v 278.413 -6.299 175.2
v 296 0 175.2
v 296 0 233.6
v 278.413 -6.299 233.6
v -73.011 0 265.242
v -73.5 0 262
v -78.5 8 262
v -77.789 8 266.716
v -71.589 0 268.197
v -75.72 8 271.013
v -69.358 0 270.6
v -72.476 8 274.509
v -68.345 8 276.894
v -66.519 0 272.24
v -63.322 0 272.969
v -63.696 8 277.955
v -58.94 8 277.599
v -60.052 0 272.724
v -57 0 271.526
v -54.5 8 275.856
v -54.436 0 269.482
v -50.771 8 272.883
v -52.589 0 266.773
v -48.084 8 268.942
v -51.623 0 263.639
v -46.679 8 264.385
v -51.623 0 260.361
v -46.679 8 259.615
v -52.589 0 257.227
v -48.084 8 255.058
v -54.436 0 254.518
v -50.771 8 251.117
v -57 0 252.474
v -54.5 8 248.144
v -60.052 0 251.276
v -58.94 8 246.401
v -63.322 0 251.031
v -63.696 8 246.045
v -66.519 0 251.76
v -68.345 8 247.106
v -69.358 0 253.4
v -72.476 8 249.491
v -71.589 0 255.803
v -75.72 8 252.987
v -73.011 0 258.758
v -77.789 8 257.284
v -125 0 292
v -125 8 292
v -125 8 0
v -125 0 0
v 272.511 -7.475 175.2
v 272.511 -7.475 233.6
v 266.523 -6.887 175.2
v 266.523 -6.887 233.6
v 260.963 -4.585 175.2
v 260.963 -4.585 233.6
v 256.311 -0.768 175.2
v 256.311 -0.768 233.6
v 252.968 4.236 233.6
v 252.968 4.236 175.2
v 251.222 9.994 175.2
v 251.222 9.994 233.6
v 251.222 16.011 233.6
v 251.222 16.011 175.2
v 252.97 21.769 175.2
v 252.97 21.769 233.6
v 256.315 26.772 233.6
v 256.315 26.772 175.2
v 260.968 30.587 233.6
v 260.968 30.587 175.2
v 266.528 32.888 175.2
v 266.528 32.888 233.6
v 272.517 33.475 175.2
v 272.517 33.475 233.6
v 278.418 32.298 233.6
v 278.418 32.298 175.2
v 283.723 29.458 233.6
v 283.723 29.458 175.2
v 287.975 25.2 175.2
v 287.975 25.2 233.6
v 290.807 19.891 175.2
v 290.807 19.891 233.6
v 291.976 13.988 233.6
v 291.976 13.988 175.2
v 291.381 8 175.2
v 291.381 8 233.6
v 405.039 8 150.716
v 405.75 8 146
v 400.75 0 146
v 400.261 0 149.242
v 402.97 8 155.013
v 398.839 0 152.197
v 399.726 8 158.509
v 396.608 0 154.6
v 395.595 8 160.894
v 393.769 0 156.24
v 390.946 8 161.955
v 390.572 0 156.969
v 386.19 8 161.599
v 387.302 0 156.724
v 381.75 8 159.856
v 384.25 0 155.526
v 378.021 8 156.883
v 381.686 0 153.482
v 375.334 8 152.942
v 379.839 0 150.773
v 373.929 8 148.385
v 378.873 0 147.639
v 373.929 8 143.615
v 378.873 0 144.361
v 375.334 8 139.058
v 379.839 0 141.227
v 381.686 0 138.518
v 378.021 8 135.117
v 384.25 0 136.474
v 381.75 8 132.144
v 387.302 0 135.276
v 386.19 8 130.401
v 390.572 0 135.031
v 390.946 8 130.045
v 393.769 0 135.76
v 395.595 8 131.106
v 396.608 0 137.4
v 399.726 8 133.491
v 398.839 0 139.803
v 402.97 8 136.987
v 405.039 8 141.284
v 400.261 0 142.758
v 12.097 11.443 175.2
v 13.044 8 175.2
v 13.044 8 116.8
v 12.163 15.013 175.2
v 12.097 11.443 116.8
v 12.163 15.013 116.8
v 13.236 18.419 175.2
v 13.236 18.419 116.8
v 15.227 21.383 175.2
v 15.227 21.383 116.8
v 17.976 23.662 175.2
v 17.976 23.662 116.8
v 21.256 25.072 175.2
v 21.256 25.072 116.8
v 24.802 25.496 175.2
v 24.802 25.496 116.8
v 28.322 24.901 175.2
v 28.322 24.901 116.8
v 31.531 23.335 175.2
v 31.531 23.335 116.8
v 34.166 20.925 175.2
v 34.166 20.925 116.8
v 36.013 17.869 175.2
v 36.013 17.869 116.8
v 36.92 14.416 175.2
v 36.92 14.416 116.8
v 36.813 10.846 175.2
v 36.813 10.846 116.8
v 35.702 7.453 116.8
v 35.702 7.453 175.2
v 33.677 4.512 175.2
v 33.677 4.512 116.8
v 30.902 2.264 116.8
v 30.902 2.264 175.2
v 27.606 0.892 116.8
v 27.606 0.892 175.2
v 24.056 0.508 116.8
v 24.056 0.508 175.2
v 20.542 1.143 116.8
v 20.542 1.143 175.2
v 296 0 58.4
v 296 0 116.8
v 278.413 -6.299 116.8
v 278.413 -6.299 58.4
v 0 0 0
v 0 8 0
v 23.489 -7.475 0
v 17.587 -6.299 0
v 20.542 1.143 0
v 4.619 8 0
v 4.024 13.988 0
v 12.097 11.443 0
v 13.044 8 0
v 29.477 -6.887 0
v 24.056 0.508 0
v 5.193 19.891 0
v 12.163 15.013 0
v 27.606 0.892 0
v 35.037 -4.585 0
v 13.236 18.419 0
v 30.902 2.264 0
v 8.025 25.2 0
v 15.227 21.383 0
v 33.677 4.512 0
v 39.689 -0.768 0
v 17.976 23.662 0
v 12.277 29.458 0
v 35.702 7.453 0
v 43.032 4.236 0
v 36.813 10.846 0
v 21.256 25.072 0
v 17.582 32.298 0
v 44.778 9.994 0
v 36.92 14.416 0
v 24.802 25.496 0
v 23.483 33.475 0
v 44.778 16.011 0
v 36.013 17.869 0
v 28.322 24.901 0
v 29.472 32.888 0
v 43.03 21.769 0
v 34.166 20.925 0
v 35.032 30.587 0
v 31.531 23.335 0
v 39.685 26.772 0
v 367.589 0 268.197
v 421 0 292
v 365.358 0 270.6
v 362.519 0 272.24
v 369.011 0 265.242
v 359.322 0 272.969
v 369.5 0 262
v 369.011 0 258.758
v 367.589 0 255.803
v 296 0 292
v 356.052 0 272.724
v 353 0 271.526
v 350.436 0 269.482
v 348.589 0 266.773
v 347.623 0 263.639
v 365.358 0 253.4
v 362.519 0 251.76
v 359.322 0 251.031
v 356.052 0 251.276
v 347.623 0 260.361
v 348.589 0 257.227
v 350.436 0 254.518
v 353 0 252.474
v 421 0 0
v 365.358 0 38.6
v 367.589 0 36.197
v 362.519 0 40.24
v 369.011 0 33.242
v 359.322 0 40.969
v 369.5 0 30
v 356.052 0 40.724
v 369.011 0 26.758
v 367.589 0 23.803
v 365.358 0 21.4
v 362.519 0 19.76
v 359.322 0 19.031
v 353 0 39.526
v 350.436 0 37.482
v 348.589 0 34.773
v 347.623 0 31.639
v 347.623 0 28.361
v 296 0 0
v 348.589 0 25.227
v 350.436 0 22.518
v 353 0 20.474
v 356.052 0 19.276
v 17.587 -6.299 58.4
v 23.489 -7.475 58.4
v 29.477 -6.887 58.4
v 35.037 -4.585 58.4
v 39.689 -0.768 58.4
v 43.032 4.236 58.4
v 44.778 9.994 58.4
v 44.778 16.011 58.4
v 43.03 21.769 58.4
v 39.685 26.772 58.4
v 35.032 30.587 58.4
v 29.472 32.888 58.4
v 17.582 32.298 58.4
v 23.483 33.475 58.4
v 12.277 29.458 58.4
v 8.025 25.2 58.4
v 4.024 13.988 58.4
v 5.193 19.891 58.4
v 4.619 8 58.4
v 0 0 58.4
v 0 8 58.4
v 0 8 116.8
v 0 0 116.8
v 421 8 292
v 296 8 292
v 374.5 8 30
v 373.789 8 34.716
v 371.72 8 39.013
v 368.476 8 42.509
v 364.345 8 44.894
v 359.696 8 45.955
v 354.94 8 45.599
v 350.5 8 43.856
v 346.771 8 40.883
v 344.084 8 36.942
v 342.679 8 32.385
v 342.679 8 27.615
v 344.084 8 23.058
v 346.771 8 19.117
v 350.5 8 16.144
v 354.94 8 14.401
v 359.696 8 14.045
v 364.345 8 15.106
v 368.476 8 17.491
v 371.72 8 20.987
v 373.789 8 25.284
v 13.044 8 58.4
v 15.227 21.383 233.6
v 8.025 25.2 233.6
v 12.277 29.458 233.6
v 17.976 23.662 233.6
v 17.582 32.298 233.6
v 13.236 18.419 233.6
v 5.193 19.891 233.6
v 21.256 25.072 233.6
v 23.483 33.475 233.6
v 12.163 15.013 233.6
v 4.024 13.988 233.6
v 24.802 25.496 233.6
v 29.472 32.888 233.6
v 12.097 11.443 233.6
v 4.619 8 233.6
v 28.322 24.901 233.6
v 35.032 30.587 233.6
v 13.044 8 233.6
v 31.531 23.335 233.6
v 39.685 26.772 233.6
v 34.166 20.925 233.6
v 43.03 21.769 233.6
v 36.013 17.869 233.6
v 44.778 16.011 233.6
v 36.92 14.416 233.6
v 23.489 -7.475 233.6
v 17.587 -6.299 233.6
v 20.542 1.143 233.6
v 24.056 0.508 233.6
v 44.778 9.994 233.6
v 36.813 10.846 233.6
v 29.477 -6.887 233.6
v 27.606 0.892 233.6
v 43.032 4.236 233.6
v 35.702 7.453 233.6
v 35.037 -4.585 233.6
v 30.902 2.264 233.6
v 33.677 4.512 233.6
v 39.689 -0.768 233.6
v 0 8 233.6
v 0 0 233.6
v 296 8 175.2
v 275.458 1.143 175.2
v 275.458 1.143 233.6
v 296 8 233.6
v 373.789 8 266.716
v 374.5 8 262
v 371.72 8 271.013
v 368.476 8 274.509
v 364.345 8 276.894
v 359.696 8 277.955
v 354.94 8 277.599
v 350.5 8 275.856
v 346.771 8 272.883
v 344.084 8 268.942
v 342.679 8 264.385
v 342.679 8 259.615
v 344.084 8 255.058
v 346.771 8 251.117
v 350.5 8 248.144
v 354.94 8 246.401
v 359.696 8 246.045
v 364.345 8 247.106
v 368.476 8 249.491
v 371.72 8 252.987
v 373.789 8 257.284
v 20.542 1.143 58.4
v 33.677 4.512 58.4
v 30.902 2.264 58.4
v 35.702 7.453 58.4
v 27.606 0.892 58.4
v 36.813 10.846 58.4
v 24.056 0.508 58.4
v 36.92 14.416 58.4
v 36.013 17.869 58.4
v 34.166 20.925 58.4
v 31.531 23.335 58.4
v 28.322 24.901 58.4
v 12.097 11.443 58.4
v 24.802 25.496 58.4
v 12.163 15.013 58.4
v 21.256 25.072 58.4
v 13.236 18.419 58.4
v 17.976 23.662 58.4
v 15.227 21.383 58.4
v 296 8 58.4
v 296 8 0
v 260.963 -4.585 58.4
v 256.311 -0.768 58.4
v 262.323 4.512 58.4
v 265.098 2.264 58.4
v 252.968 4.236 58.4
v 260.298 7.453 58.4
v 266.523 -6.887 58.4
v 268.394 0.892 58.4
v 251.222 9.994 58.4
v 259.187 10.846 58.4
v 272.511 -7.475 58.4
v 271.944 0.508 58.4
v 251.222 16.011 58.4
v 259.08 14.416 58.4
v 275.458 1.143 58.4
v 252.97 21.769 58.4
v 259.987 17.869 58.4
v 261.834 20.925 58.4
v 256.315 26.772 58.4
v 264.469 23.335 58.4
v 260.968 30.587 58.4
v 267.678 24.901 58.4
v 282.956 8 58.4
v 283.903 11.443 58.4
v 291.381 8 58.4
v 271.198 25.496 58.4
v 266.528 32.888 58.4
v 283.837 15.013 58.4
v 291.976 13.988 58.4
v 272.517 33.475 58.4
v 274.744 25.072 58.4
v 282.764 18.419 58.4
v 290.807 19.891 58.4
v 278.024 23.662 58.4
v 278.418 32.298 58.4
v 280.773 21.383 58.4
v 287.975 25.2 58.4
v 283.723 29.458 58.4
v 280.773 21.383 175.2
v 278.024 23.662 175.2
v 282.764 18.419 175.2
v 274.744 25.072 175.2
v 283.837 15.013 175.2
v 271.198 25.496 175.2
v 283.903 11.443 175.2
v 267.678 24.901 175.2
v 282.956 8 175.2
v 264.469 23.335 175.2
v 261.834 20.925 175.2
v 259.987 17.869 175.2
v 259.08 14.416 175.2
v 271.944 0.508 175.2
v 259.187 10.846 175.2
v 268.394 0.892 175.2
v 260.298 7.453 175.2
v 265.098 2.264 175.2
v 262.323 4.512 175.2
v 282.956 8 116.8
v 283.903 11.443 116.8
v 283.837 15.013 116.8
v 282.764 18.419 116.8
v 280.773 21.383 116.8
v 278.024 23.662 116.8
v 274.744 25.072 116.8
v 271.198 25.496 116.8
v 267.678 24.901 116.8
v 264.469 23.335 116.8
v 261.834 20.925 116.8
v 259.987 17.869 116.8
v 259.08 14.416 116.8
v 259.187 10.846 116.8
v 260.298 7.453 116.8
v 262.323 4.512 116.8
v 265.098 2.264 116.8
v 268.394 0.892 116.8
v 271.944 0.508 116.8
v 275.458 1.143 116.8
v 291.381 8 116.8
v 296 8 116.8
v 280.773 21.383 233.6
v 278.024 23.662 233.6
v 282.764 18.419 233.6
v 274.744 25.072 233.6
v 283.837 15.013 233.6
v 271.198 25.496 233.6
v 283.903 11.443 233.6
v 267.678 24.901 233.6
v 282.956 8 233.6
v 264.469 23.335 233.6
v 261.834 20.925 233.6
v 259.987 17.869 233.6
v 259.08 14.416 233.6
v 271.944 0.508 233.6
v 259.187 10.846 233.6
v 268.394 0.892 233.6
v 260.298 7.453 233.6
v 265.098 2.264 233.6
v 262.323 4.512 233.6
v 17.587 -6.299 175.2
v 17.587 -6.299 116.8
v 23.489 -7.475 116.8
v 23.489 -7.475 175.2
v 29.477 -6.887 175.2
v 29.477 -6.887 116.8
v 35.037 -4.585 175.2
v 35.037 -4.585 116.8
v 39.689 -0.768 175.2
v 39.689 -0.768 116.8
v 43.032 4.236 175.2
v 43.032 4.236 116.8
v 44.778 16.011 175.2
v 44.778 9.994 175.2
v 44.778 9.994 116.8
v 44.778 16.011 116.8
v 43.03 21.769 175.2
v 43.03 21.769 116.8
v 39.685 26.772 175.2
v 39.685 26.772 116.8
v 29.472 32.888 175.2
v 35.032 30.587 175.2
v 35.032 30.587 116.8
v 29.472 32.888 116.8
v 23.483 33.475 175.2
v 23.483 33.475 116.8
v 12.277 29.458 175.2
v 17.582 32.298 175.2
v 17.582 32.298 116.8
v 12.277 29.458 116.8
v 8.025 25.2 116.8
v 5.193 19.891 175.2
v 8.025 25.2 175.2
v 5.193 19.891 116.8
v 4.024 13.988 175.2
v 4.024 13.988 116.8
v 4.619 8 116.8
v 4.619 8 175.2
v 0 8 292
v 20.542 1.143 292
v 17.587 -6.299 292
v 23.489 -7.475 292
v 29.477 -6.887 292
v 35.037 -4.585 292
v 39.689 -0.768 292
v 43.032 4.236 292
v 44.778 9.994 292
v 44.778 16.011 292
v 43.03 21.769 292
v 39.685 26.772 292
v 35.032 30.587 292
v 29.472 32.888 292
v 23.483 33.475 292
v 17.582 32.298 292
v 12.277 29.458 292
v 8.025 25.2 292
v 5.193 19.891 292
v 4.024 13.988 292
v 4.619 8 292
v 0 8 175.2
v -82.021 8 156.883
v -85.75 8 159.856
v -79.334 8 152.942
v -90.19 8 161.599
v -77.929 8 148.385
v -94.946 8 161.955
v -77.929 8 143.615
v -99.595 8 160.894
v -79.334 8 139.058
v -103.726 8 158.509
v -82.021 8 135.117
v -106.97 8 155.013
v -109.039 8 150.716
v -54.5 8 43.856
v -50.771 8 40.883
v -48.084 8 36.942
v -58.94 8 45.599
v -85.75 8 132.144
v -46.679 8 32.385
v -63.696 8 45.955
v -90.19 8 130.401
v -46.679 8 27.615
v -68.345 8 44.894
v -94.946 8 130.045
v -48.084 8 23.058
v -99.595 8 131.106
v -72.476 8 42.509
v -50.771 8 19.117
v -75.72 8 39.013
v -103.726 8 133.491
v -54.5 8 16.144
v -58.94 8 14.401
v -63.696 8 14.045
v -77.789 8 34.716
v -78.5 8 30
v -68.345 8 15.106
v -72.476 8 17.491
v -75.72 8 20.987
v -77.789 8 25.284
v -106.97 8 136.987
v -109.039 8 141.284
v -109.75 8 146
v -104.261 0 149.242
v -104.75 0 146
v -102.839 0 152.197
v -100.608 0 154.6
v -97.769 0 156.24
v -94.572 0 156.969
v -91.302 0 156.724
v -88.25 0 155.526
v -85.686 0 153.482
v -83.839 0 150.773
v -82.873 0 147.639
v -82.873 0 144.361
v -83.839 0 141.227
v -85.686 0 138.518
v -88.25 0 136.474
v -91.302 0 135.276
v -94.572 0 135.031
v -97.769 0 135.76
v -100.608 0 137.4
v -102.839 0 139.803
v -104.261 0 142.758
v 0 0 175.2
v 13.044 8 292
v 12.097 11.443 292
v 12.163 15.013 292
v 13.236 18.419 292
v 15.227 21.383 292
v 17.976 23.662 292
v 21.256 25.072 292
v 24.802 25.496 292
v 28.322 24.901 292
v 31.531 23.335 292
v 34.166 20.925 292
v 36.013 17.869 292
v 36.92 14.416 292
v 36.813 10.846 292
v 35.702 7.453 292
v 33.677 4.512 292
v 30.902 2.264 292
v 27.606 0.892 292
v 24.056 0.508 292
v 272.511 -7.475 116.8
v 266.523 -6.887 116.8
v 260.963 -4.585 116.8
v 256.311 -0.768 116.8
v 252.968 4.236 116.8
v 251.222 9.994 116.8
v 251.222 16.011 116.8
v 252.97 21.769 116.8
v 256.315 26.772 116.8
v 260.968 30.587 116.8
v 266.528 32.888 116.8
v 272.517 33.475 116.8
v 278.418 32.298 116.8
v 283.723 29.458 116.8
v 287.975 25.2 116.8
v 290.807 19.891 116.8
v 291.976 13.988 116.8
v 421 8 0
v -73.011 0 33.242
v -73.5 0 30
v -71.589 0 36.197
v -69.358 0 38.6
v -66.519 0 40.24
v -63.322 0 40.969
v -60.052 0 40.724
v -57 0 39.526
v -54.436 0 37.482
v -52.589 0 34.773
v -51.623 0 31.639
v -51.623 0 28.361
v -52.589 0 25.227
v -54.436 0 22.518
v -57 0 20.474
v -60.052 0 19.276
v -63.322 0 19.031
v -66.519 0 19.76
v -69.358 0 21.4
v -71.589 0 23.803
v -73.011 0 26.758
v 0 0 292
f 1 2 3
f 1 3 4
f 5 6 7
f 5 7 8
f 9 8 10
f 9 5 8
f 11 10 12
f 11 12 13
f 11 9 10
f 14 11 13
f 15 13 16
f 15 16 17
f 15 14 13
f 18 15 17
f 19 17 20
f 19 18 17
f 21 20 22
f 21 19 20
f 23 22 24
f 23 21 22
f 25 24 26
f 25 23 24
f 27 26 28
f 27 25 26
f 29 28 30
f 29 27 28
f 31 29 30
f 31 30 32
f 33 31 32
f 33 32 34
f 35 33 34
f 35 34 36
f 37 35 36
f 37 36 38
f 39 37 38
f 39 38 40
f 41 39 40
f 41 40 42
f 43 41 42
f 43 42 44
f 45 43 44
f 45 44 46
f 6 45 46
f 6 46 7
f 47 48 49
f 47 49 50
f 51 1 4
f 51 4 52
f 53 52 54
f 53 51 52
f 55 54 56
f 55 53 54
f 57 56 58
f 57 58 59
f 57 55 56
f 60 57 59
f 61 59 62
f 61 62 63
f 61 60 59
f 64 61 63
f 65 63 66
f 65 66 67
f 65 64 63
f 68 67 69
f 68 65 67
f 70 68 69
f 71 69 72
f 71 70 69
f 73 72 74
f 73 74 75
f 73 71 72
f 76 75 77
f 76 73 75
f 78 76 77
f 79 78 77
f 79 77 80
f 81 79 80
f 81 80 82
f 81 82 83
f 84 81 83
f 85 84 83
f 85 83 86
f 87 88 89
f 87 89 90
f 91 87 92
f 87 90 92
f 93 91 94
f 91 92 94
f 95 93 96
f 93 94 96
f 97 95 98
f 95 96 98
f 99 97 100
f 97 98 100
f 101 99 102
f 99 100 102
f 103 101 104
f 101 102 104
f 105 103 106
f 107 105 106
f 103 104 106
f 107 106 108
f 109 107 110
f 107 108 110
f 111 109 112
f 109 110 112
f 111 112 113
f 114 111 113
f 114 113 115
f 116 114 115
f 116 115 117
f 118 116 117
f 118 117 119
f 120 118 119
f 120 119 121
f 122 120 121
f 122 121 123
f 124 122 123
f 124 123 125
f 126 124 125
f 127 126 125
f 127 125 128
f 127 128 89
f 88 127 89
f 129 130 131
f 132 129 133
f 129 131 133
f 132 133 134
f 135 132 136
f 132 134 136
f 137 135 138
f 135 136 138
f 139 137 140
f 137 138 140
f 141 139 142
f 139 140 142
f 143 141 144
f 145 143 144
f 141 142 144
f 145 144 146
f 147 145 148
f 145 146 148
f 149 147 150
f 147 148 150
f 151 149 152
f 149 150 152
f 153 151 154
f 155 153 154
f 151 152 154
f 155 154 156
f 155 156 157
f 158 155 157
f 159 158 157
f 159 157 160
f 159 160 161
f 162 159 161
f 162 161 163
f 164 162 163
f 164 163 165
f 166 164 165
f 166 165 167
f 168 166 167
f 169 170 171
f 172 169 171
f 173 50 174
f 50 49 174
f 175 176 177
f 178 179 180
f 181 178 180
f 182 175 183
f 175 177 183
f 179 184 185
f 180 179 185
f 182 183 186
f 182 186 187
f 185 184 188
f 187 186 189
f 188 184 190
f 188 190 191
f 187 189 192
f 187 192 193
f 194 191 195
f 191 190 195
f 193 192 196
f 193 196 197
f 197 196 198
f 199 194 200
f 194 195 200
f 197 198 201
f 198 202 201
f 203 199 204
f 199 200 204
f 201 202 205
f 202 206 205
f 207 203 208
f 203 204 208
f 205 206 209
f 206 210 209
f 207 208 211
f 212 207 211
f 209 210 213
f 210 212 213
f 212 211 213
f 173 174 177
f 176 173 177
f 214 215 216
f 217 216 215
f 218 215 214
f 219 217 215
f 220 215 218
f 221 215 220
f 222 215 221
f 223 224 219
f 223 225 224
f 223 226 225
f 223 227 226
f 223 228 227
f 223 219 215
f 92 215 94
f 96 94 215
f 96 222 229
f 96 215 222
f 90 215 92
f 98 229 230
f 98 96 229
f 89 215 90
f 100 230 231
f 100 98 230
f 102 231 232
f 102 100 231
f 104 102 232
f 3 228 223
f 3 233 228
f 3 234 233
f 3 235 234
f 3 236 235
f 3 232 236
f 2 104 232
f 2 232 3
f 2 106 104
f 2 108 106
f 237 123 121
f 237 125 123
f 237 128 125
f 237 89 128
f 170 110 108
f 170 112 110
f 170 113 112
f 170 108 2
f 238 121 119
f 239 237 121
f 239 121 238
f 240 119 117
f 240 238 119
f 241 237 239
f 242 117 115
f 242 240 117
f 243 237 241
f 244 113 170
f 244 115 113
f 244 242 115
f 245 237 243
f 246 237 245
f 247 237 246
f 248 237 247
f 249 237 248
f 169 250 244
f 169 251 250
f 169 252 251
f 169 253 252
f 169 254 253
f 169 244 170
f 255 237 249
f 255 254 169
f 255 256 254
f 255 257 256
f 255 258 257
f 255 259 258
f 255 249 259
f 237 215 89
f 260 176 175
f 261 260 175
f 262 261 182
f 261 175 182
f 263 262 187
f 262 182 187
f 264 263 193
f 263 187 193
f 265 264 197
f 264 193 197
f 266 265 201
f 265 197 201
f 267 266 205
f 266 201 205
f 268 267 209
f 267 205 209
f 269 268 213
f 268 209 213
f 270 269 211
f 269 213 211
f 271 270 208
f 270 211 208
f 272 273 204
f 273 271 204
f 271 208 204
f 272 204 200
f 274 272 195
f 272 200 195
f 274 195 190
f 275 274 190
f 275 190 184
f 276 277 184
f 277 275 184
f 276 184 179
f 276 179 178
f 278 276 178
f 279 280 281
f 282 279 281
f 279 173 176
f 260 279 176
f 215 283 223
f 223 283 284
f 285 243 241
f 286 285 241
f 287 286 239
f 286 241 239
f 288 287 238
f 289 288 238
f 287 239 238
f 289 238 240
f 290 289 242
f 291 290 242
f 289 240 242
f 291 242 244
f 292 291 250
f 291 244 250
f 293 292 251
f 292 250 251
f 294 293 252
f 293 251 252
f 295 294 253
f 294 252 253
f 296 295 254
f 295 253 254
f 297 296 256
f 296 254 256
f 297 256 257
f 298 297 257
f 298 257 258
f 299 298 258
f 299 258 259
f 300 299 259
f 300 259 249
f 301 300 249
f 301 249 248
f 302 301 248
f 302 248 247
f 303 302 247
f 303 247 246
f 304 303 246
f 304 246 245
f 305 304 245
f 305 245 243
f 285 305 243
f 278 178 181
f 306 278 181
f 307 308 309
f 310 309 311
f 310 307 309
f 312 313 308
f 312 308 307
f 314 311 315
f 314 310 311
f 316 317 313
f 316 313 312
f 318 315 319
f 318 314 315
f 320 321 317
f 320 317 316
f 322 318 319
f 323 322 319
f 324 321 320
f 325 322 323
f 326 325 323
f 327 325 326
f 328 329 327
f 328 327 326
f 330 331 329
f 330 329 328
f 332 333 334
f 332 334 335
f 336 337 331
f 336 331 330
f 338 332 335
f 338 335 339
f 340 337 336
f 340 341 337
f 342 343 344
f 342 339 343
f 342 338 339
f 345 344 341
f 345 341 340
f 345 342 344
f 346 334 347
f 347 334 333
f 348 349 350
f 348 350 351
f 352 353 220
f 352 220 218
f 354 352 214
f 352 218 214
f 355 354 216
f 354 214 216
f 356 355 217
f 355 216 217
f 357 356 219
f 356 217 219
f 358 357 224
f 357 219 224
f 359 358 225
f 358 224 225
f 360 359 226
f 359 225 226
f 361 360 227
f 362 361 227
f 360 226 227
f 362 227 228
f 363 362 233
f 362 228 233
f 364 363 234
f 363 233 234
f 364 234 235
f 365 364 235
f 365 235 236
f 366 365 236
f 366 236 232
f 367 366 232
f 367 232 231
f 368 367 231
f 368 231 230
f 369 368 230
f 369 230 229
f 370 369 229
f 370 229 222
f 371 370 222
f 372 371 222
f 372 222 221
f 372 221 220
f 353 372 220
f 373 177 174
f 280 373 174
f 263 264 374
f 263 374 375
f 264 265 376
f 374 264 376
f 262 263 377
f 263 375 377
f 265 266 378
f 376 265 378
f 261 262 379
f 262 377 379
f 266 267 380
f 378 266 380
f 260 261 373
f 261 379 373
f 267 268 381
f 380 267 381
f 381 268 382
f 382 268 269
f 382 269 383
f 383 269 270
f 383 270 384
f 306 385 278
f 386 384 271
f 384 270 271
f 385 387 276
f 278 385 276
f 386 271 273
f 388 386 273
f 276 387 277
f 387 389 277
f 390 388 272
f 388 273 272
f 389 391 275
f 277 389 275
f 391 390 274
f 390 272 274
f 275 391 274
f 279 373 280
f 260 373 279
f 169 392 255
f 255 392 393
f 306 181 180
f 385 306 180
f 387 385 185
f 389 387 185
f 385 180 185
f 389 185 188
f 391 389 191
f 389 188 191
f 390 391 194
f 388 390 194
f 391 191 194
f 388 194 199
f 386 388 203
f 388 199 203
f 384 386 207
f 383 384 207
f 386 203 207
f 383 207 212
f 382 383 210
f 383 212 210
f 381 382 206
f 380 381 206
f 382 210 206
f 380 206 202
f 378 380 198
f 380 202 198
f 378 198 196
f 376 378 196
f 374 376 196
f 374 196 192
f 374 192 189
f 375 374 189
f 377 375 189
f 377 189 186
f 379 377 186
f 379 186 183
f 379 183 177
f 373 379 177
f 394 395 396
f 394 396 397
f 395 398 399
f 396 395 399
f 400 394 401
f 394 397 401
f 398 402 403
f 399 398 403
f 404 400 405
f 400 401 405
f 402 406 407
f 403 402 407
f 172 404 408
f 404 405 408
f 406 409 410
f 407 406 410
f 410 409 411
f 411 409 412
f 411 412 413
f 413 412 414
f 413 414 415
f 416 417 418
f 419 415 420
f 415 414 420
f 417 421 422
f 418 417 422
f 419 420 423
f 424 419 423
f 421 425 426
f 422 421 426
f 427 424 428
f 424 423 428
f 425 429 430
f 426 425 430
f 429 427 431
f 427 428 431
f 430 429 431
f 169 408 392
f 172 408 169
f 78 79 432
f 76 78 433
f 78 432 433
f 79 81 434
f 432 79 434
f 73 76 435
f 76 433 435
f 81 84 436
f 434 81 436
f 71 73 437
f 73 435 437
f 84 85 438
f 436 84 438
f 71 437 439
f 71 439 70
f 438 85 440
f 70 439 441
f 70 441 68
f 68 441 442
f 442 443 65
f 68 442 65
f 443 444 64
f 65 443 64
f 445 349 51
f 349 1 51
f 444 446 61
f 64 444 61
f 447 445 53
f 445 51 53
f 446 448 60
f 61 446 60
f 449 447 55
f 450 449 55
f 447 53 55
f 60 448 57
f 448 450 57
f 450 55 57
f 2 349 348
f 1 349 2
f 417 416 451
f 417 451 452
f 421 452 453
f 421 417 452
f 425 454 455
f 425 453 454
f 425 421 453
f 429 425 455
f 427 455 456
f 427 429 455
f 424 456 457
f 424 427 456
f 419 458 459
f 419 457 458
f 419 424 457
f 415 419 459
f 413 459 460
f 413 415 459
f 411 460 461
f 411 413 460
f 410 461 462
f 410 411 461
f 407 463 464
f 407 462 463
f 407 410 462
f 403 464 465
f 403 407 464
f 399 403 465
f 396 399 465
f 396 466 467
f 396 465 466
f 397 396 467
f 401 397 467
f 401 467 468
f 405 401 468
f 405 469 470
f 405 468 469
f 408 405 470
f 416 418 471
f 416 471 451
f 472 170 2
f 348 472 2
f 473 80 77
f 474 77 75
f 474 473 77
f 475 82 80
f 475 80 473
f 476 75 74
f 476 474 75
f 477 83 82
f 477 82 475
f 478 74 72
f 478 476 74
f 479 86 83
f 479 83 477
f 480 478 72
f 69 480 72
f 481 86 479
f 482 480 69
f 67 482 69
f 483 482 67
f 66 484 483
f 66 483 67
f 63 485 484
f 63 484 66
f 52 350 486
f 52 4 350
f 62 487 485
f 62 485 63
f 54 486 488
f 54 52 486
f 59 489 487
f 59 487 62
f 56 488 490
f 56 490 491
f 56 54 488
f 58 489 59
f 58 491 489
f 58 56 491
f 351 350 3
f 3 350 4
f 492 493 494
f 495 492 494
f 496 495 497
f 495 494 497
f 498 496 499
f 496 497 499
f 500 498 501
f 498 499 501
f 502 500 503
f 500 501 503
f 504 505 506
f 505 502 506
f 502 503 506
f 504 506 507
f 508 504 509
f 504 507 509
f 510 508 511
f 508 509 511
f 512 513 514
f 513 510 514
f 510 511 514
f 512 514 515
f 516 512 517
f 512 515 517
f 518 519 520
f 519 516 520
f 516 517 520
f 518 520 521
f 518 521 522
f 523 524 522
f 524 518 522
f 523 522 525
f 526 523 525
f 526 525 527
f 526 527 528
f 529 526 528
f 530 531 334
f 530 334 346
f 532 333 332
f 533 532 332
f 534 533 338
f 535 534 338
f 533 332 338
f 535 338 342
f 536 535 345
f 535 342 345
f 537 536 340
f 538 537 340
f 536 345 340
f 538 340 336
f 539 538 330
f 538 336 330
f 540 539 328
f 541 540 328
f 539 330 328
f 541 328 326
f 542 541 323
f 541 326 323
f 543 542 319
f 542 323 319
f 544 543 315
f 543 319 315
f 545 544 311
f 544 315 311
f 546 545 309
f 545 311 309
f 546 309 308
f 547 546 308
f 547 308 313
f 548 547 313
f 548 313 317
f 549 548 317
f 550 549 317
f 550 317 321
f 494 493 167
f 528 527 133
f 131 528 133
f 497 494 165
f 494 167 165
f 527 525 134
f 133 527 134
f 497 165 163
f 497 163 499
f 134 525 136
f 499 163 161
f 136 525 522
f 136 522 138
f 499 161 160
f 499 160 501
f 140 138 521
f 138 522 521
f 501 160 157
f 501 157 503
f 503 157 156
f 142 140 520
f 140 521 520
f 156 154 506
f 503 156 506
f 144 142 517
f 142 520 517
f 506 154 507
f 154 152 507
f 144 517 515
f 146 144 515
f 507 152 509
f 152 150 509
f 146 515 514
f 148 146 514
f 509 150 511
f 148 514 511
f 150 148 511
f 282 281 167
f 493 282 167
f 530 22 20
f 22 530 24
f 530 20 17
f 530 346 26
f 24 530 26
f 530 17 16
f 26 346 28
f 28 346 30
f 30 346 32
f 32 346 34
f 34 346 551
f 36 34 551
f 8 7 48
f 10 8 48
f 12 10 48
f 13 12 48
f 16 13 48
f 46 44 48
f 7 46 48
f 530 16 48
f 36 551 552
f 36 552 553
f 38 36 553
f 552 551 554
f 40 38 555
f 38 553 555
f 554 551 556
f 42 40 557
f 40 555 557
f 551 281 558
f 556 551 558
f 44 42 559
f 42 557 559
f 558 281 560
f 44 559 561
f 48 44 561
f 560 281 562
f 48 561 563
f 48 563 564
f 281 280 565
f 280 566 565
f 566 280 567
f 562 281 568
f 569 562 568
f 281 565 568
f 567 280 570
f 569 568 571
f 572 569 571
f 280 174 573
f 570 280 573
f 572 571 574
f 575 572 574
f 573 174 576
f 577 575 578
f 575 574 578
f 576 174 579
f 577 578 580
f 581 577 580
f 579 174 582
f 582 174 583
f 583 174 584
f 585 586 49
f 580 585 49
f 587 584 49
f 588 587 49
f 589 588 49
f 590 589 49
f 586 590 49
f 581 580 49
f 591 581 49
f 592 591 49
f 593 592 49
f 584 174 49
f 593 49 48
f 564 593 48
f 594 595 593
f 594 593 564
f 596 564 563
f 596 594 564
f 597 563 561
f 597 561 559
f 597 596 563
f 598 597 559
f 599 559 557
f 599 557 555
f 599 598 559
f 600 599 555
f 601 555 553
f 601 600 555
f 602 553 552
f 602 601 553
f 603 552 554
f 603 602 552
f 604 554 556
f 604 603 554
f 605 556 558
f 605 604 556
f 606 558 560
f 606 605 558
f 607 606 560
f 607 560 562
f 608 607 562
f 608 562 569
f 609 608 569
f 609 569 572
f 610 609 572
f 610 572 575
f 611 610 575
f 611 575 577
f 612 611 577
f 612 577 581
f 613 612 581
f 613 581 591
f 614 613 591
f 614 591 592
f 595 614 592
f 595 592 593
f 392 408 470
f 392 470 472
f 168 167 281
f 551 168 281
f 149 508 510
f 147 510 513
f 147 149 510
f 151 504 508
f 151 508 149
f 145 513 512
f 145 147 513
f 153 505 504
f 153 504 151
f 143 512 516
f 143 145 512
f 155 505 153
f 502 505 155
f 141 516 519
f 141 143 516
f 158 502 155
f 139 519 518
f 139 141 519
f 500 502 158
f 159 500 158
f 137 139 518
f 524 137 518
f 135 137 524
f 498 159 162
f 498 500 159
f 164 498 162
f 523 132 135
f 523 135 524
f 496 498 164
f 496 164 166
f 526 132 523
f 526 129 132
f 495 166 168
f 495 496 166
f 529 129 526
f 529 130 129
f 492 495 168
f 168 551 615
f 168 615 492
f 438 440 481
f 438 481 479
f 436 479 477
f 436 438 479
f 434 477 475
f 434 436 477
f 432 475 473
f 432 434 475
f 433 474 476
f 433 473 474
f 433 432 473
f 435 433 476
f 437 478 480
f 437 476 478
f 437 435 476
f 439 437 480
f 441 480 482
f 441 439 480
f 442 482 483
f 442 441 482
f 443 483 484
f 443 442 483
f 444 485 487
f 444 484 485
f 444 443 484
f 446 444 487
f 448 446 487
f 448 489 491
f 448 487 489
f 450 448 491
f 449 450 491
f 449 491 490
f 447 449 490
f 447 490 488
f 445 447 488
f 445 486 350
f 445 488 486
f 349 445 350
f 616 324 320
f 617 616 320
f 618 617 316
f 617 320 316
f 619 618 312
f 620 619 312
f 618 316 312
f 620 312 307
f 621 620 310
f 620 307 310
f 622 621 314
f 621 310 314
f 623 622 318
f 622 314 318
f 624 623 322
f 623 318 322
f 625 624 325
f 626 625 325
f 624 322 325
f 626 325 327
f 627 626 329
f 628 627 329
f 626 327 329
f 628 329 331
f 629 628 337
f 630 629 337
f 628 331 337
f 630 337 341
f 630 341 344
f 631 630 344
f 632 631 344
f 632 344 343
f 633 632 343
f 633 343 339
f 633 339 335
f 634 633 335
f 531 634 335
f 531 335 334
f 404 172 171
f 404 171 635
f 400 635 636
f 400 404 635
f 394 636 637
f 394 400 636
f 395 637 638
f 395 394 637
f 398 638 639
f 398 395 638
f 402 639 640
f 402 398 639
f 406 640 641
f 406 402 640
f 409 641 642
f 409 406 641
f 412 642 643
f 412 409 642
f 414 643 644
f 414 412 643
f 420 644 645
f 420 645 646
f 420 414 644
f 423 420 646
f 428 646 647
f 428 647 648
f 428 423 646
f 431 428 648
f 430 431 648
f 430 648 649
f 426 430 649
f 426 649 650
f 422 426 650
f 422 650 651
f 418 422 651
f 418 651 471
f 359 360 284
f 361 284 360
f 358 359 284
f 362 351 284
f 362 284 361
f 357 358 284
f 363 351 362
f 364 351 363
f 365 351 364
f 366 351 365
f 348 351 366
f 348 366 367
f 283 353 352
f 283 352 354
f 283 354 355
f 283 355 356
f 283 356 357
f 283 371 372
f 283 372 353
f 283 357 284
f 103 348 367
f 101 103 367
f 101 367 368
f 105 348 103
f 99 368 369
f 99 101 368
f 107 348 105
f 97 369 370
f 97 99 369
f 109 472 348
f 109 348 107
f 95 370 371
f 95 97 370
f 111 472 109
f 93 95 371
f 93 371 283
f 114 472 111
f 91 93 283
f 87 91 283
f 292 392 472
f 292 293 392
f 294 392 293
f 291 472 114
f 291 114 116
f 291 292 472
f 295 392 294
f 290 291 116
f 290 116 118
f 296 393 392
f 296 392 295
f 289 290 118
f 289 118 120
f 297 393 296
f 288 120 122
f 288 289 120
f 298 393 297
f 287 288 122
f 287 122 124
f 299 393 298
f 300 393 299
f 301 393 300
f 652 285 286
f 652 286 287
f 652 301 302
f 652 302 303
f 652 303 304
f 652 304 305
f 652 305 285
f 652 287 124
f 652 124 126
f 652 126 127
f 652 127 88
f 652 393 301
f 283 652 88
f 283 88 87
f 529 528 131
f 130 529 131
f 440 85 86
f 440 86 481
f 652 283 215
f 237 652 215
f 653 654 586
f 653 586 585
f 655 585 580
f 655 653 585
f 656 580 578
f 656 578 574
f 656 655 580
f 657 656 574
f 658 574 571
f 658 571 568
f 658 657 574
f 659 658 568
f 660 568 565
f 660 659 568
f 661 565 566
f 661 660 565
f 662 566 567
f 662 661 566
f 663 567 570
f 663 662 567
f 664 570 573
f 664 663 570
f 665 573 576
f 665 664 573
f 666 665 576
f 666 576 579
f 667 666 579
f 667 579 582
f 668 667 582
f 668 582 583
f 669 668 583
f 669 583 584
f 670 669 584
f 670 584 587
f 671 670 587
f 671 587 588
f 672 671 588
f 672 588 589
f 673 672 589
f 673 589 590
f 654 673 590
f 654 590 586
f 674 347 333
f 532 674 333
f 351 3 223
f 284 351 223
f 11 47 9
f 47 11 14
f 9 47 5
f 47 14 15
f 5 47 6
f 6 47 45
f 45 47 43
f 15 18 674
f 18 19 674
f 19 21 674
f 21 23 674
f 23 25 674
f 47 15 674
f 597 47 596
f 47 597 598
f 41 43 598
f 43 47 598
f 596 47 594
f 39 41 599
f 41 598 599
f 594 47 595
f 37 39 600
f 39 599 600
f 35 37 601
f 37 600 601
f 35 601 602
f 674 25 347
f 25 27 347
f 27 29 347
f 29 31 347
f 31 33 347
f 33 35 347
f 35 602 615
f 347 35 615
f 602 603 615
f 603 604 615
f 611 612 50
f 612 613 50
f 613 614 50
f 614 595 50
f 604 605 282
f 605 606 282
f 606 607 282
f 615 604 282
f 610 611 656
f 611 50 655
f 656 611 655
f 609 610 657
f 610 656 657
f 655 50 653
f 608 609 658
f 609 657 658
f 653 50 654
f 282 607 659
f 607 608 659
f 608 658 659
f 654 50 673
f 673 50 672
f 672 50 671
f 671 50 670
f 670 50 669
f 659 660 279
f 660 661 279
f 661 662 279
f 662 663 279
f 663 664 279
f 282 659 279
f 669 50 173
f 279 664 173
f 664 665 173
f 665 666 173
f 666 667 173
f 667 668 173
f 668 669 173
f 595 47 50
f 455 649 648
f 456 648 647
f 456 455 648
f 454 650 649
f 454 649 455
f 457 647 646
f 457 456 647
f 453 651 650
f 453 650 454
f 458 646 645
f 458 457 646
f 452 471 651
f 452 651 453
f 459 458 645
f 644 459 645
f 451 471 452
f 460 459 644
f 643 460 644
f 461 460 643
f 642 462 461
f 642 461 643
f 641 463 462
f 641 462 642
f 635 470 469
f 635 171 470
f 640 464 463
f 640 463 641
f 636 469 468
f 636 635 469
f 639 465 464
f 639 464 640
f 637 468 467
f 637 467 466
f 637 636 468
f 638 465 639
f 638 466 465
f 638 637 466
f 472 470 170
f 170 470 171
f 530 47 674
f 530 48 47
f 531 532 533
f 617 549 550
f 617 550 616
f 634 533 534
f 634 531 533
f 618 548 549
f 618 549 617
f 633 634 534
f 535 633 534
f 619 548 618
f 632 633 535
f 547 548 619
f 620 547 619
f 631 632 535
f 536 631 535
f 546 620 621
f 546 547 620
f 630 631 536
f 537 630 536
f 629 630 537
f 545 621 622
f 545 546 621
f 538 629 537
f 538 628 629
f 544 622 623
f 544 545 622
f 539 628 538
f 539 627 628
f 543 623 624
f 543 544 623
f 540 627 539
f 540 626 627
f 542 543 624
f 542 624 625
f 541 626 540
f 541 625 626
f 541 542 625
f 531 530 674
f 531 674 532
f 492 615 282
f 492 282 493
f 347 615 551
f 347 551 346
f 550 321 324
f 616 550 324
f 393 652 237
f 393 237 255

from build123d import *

# Parameters (mm, degrees)
F1_DEPTH  = 292
F2_R      = 16
F3_R      = 11
F10_DEPTH = 50
F11_W     = 58.2078508139
F11_H     = 58.4
F11_W_2   = 55.7445994616
F12_DEPTH = 50


with BuildPart() as f1:
    # F0 (on Top) → F1 (new body)
    with BuildSketch(Plane.XY):
        with BuildLine():
            Line((-125, 0), (0, 0))
            Line((0, 0), (17.5874304335, -6.2993881247))
            ThreePointArc((17.5874304335, -6.2993881247), (39.6852087826, 26.7716895924), (4.6191046479, 8))
            Line((4.6191046479, 8), (13.0435607626, 8))
            ThreePointArc((13.0435607626, 8), (32.9352692932, 22.2247618913), (20.5422238932, 1.1431029233))
            Line((20.5422238932, 1.1431029233), (0, 8))
            Line((0, 8), (-125, 8))
            Line((-125, 8), (-125, 0))
        make_face()
    extrude(amount=F1_DEPTH)

    # F2 (on face) → F4 section 0
    with BuildSketch(Plane(origin=(0, 8, 0), x_dir=(-1, 0, 0), z_dir=(0, 1, 0))):
        with Locations((62.5, 30)):
            Circle(F2_R)
    # F3 (on face) → F4 section 1
    with BuildSketch(Plane.XZ):
        with Locations((-62.5, 30)):
            Circle(F3_R)
    loft(mode=Mode.SUBTRACT)

    # F2 (on face) → F5 section 0
    with BuildSketch(Plane(origin=(0, 8, 0), x_dir=(-1, 0, 0), z_dir=(0, 1, 0))):
        with Locations((93.75, 146)):
            Circle(F2_R)
    # F3 (on face) → F5 section 1
    with BuildSketch(Plane.XZ):
        with Locations((-93.75, 146)):
            Circle(F3_R)
    loft(mode=Mode.SUBTRACT)

    # F2 (on face) → F6 section 0
    with BuildSketch(Plane(origin=(0, 8, 0), x_dir=(-1, 0, 0), z_dir=(0, 1, 0))):
        with Locations((62.5, 262)):
            Circle(F2_R)
    # F3 (on face) → F6 section 1
    with BuildSketch(Plane.XZ):
        with Locations((-62.5, 262)):
            Circle(F3_R)
    loft(mode=Mode.SUBTRACT)


with BuildPart() as f8_1:
    # F8: instance of F1
    add(f1.part.mirror(Plane.YZ.offset(148)))

    # F11 (on face) → F12 (cut, symmetric)
    with BuildSketch(Plane(origin=(0, 8, 0), x_dir=(-1, 0, 0), z_dir=(0, 1, 0))):
        with Locations((-266.8960745931, 262.8)):
            Rectangle(F11_W, F11_H)
        with Locations((-268.1277002692, 146)):
            Rectangle(F11_W_2, F11_H)
        Polygon((-296, 58.4), (-296, 0), (-240.2948439121, 0), (-234.1786623001, 0), (-234.1786623001, 58.4), (-240.2554005384, 58.4), align=None)
    extrude(amount=F12_DEPTH, both=True, mode=Mode.SUBTRACT)


with BuildPart() as f1_1:
    add(f1.part)

    # F9 (on face) → F10 (cut, symmetric)
    with BuildSketch(Plane(origin=(0, 8, 0), x_dir=(-1, 0, 0), z_dir=(0, 1, 0))):
        Polygon((-56.8476691842, 175.2), (0, 175.2), (0, 233.6), (-57.3937855661, 233.6), (-57.3937855661, 175.2), align=None)
        Polygon((-56.8476691842, 58.4), (0, 58.4), (0, 116.8), (-56.8476691842, 116.8), (-63.7657642365, 116.8), (-63.7657642365, 58.4), align=None)
    extrude(amount=F10_DEPTH, both=True, mode=Mode.SUBTRACT)


solid = Compound([f8_1.part, f1_1.part])
